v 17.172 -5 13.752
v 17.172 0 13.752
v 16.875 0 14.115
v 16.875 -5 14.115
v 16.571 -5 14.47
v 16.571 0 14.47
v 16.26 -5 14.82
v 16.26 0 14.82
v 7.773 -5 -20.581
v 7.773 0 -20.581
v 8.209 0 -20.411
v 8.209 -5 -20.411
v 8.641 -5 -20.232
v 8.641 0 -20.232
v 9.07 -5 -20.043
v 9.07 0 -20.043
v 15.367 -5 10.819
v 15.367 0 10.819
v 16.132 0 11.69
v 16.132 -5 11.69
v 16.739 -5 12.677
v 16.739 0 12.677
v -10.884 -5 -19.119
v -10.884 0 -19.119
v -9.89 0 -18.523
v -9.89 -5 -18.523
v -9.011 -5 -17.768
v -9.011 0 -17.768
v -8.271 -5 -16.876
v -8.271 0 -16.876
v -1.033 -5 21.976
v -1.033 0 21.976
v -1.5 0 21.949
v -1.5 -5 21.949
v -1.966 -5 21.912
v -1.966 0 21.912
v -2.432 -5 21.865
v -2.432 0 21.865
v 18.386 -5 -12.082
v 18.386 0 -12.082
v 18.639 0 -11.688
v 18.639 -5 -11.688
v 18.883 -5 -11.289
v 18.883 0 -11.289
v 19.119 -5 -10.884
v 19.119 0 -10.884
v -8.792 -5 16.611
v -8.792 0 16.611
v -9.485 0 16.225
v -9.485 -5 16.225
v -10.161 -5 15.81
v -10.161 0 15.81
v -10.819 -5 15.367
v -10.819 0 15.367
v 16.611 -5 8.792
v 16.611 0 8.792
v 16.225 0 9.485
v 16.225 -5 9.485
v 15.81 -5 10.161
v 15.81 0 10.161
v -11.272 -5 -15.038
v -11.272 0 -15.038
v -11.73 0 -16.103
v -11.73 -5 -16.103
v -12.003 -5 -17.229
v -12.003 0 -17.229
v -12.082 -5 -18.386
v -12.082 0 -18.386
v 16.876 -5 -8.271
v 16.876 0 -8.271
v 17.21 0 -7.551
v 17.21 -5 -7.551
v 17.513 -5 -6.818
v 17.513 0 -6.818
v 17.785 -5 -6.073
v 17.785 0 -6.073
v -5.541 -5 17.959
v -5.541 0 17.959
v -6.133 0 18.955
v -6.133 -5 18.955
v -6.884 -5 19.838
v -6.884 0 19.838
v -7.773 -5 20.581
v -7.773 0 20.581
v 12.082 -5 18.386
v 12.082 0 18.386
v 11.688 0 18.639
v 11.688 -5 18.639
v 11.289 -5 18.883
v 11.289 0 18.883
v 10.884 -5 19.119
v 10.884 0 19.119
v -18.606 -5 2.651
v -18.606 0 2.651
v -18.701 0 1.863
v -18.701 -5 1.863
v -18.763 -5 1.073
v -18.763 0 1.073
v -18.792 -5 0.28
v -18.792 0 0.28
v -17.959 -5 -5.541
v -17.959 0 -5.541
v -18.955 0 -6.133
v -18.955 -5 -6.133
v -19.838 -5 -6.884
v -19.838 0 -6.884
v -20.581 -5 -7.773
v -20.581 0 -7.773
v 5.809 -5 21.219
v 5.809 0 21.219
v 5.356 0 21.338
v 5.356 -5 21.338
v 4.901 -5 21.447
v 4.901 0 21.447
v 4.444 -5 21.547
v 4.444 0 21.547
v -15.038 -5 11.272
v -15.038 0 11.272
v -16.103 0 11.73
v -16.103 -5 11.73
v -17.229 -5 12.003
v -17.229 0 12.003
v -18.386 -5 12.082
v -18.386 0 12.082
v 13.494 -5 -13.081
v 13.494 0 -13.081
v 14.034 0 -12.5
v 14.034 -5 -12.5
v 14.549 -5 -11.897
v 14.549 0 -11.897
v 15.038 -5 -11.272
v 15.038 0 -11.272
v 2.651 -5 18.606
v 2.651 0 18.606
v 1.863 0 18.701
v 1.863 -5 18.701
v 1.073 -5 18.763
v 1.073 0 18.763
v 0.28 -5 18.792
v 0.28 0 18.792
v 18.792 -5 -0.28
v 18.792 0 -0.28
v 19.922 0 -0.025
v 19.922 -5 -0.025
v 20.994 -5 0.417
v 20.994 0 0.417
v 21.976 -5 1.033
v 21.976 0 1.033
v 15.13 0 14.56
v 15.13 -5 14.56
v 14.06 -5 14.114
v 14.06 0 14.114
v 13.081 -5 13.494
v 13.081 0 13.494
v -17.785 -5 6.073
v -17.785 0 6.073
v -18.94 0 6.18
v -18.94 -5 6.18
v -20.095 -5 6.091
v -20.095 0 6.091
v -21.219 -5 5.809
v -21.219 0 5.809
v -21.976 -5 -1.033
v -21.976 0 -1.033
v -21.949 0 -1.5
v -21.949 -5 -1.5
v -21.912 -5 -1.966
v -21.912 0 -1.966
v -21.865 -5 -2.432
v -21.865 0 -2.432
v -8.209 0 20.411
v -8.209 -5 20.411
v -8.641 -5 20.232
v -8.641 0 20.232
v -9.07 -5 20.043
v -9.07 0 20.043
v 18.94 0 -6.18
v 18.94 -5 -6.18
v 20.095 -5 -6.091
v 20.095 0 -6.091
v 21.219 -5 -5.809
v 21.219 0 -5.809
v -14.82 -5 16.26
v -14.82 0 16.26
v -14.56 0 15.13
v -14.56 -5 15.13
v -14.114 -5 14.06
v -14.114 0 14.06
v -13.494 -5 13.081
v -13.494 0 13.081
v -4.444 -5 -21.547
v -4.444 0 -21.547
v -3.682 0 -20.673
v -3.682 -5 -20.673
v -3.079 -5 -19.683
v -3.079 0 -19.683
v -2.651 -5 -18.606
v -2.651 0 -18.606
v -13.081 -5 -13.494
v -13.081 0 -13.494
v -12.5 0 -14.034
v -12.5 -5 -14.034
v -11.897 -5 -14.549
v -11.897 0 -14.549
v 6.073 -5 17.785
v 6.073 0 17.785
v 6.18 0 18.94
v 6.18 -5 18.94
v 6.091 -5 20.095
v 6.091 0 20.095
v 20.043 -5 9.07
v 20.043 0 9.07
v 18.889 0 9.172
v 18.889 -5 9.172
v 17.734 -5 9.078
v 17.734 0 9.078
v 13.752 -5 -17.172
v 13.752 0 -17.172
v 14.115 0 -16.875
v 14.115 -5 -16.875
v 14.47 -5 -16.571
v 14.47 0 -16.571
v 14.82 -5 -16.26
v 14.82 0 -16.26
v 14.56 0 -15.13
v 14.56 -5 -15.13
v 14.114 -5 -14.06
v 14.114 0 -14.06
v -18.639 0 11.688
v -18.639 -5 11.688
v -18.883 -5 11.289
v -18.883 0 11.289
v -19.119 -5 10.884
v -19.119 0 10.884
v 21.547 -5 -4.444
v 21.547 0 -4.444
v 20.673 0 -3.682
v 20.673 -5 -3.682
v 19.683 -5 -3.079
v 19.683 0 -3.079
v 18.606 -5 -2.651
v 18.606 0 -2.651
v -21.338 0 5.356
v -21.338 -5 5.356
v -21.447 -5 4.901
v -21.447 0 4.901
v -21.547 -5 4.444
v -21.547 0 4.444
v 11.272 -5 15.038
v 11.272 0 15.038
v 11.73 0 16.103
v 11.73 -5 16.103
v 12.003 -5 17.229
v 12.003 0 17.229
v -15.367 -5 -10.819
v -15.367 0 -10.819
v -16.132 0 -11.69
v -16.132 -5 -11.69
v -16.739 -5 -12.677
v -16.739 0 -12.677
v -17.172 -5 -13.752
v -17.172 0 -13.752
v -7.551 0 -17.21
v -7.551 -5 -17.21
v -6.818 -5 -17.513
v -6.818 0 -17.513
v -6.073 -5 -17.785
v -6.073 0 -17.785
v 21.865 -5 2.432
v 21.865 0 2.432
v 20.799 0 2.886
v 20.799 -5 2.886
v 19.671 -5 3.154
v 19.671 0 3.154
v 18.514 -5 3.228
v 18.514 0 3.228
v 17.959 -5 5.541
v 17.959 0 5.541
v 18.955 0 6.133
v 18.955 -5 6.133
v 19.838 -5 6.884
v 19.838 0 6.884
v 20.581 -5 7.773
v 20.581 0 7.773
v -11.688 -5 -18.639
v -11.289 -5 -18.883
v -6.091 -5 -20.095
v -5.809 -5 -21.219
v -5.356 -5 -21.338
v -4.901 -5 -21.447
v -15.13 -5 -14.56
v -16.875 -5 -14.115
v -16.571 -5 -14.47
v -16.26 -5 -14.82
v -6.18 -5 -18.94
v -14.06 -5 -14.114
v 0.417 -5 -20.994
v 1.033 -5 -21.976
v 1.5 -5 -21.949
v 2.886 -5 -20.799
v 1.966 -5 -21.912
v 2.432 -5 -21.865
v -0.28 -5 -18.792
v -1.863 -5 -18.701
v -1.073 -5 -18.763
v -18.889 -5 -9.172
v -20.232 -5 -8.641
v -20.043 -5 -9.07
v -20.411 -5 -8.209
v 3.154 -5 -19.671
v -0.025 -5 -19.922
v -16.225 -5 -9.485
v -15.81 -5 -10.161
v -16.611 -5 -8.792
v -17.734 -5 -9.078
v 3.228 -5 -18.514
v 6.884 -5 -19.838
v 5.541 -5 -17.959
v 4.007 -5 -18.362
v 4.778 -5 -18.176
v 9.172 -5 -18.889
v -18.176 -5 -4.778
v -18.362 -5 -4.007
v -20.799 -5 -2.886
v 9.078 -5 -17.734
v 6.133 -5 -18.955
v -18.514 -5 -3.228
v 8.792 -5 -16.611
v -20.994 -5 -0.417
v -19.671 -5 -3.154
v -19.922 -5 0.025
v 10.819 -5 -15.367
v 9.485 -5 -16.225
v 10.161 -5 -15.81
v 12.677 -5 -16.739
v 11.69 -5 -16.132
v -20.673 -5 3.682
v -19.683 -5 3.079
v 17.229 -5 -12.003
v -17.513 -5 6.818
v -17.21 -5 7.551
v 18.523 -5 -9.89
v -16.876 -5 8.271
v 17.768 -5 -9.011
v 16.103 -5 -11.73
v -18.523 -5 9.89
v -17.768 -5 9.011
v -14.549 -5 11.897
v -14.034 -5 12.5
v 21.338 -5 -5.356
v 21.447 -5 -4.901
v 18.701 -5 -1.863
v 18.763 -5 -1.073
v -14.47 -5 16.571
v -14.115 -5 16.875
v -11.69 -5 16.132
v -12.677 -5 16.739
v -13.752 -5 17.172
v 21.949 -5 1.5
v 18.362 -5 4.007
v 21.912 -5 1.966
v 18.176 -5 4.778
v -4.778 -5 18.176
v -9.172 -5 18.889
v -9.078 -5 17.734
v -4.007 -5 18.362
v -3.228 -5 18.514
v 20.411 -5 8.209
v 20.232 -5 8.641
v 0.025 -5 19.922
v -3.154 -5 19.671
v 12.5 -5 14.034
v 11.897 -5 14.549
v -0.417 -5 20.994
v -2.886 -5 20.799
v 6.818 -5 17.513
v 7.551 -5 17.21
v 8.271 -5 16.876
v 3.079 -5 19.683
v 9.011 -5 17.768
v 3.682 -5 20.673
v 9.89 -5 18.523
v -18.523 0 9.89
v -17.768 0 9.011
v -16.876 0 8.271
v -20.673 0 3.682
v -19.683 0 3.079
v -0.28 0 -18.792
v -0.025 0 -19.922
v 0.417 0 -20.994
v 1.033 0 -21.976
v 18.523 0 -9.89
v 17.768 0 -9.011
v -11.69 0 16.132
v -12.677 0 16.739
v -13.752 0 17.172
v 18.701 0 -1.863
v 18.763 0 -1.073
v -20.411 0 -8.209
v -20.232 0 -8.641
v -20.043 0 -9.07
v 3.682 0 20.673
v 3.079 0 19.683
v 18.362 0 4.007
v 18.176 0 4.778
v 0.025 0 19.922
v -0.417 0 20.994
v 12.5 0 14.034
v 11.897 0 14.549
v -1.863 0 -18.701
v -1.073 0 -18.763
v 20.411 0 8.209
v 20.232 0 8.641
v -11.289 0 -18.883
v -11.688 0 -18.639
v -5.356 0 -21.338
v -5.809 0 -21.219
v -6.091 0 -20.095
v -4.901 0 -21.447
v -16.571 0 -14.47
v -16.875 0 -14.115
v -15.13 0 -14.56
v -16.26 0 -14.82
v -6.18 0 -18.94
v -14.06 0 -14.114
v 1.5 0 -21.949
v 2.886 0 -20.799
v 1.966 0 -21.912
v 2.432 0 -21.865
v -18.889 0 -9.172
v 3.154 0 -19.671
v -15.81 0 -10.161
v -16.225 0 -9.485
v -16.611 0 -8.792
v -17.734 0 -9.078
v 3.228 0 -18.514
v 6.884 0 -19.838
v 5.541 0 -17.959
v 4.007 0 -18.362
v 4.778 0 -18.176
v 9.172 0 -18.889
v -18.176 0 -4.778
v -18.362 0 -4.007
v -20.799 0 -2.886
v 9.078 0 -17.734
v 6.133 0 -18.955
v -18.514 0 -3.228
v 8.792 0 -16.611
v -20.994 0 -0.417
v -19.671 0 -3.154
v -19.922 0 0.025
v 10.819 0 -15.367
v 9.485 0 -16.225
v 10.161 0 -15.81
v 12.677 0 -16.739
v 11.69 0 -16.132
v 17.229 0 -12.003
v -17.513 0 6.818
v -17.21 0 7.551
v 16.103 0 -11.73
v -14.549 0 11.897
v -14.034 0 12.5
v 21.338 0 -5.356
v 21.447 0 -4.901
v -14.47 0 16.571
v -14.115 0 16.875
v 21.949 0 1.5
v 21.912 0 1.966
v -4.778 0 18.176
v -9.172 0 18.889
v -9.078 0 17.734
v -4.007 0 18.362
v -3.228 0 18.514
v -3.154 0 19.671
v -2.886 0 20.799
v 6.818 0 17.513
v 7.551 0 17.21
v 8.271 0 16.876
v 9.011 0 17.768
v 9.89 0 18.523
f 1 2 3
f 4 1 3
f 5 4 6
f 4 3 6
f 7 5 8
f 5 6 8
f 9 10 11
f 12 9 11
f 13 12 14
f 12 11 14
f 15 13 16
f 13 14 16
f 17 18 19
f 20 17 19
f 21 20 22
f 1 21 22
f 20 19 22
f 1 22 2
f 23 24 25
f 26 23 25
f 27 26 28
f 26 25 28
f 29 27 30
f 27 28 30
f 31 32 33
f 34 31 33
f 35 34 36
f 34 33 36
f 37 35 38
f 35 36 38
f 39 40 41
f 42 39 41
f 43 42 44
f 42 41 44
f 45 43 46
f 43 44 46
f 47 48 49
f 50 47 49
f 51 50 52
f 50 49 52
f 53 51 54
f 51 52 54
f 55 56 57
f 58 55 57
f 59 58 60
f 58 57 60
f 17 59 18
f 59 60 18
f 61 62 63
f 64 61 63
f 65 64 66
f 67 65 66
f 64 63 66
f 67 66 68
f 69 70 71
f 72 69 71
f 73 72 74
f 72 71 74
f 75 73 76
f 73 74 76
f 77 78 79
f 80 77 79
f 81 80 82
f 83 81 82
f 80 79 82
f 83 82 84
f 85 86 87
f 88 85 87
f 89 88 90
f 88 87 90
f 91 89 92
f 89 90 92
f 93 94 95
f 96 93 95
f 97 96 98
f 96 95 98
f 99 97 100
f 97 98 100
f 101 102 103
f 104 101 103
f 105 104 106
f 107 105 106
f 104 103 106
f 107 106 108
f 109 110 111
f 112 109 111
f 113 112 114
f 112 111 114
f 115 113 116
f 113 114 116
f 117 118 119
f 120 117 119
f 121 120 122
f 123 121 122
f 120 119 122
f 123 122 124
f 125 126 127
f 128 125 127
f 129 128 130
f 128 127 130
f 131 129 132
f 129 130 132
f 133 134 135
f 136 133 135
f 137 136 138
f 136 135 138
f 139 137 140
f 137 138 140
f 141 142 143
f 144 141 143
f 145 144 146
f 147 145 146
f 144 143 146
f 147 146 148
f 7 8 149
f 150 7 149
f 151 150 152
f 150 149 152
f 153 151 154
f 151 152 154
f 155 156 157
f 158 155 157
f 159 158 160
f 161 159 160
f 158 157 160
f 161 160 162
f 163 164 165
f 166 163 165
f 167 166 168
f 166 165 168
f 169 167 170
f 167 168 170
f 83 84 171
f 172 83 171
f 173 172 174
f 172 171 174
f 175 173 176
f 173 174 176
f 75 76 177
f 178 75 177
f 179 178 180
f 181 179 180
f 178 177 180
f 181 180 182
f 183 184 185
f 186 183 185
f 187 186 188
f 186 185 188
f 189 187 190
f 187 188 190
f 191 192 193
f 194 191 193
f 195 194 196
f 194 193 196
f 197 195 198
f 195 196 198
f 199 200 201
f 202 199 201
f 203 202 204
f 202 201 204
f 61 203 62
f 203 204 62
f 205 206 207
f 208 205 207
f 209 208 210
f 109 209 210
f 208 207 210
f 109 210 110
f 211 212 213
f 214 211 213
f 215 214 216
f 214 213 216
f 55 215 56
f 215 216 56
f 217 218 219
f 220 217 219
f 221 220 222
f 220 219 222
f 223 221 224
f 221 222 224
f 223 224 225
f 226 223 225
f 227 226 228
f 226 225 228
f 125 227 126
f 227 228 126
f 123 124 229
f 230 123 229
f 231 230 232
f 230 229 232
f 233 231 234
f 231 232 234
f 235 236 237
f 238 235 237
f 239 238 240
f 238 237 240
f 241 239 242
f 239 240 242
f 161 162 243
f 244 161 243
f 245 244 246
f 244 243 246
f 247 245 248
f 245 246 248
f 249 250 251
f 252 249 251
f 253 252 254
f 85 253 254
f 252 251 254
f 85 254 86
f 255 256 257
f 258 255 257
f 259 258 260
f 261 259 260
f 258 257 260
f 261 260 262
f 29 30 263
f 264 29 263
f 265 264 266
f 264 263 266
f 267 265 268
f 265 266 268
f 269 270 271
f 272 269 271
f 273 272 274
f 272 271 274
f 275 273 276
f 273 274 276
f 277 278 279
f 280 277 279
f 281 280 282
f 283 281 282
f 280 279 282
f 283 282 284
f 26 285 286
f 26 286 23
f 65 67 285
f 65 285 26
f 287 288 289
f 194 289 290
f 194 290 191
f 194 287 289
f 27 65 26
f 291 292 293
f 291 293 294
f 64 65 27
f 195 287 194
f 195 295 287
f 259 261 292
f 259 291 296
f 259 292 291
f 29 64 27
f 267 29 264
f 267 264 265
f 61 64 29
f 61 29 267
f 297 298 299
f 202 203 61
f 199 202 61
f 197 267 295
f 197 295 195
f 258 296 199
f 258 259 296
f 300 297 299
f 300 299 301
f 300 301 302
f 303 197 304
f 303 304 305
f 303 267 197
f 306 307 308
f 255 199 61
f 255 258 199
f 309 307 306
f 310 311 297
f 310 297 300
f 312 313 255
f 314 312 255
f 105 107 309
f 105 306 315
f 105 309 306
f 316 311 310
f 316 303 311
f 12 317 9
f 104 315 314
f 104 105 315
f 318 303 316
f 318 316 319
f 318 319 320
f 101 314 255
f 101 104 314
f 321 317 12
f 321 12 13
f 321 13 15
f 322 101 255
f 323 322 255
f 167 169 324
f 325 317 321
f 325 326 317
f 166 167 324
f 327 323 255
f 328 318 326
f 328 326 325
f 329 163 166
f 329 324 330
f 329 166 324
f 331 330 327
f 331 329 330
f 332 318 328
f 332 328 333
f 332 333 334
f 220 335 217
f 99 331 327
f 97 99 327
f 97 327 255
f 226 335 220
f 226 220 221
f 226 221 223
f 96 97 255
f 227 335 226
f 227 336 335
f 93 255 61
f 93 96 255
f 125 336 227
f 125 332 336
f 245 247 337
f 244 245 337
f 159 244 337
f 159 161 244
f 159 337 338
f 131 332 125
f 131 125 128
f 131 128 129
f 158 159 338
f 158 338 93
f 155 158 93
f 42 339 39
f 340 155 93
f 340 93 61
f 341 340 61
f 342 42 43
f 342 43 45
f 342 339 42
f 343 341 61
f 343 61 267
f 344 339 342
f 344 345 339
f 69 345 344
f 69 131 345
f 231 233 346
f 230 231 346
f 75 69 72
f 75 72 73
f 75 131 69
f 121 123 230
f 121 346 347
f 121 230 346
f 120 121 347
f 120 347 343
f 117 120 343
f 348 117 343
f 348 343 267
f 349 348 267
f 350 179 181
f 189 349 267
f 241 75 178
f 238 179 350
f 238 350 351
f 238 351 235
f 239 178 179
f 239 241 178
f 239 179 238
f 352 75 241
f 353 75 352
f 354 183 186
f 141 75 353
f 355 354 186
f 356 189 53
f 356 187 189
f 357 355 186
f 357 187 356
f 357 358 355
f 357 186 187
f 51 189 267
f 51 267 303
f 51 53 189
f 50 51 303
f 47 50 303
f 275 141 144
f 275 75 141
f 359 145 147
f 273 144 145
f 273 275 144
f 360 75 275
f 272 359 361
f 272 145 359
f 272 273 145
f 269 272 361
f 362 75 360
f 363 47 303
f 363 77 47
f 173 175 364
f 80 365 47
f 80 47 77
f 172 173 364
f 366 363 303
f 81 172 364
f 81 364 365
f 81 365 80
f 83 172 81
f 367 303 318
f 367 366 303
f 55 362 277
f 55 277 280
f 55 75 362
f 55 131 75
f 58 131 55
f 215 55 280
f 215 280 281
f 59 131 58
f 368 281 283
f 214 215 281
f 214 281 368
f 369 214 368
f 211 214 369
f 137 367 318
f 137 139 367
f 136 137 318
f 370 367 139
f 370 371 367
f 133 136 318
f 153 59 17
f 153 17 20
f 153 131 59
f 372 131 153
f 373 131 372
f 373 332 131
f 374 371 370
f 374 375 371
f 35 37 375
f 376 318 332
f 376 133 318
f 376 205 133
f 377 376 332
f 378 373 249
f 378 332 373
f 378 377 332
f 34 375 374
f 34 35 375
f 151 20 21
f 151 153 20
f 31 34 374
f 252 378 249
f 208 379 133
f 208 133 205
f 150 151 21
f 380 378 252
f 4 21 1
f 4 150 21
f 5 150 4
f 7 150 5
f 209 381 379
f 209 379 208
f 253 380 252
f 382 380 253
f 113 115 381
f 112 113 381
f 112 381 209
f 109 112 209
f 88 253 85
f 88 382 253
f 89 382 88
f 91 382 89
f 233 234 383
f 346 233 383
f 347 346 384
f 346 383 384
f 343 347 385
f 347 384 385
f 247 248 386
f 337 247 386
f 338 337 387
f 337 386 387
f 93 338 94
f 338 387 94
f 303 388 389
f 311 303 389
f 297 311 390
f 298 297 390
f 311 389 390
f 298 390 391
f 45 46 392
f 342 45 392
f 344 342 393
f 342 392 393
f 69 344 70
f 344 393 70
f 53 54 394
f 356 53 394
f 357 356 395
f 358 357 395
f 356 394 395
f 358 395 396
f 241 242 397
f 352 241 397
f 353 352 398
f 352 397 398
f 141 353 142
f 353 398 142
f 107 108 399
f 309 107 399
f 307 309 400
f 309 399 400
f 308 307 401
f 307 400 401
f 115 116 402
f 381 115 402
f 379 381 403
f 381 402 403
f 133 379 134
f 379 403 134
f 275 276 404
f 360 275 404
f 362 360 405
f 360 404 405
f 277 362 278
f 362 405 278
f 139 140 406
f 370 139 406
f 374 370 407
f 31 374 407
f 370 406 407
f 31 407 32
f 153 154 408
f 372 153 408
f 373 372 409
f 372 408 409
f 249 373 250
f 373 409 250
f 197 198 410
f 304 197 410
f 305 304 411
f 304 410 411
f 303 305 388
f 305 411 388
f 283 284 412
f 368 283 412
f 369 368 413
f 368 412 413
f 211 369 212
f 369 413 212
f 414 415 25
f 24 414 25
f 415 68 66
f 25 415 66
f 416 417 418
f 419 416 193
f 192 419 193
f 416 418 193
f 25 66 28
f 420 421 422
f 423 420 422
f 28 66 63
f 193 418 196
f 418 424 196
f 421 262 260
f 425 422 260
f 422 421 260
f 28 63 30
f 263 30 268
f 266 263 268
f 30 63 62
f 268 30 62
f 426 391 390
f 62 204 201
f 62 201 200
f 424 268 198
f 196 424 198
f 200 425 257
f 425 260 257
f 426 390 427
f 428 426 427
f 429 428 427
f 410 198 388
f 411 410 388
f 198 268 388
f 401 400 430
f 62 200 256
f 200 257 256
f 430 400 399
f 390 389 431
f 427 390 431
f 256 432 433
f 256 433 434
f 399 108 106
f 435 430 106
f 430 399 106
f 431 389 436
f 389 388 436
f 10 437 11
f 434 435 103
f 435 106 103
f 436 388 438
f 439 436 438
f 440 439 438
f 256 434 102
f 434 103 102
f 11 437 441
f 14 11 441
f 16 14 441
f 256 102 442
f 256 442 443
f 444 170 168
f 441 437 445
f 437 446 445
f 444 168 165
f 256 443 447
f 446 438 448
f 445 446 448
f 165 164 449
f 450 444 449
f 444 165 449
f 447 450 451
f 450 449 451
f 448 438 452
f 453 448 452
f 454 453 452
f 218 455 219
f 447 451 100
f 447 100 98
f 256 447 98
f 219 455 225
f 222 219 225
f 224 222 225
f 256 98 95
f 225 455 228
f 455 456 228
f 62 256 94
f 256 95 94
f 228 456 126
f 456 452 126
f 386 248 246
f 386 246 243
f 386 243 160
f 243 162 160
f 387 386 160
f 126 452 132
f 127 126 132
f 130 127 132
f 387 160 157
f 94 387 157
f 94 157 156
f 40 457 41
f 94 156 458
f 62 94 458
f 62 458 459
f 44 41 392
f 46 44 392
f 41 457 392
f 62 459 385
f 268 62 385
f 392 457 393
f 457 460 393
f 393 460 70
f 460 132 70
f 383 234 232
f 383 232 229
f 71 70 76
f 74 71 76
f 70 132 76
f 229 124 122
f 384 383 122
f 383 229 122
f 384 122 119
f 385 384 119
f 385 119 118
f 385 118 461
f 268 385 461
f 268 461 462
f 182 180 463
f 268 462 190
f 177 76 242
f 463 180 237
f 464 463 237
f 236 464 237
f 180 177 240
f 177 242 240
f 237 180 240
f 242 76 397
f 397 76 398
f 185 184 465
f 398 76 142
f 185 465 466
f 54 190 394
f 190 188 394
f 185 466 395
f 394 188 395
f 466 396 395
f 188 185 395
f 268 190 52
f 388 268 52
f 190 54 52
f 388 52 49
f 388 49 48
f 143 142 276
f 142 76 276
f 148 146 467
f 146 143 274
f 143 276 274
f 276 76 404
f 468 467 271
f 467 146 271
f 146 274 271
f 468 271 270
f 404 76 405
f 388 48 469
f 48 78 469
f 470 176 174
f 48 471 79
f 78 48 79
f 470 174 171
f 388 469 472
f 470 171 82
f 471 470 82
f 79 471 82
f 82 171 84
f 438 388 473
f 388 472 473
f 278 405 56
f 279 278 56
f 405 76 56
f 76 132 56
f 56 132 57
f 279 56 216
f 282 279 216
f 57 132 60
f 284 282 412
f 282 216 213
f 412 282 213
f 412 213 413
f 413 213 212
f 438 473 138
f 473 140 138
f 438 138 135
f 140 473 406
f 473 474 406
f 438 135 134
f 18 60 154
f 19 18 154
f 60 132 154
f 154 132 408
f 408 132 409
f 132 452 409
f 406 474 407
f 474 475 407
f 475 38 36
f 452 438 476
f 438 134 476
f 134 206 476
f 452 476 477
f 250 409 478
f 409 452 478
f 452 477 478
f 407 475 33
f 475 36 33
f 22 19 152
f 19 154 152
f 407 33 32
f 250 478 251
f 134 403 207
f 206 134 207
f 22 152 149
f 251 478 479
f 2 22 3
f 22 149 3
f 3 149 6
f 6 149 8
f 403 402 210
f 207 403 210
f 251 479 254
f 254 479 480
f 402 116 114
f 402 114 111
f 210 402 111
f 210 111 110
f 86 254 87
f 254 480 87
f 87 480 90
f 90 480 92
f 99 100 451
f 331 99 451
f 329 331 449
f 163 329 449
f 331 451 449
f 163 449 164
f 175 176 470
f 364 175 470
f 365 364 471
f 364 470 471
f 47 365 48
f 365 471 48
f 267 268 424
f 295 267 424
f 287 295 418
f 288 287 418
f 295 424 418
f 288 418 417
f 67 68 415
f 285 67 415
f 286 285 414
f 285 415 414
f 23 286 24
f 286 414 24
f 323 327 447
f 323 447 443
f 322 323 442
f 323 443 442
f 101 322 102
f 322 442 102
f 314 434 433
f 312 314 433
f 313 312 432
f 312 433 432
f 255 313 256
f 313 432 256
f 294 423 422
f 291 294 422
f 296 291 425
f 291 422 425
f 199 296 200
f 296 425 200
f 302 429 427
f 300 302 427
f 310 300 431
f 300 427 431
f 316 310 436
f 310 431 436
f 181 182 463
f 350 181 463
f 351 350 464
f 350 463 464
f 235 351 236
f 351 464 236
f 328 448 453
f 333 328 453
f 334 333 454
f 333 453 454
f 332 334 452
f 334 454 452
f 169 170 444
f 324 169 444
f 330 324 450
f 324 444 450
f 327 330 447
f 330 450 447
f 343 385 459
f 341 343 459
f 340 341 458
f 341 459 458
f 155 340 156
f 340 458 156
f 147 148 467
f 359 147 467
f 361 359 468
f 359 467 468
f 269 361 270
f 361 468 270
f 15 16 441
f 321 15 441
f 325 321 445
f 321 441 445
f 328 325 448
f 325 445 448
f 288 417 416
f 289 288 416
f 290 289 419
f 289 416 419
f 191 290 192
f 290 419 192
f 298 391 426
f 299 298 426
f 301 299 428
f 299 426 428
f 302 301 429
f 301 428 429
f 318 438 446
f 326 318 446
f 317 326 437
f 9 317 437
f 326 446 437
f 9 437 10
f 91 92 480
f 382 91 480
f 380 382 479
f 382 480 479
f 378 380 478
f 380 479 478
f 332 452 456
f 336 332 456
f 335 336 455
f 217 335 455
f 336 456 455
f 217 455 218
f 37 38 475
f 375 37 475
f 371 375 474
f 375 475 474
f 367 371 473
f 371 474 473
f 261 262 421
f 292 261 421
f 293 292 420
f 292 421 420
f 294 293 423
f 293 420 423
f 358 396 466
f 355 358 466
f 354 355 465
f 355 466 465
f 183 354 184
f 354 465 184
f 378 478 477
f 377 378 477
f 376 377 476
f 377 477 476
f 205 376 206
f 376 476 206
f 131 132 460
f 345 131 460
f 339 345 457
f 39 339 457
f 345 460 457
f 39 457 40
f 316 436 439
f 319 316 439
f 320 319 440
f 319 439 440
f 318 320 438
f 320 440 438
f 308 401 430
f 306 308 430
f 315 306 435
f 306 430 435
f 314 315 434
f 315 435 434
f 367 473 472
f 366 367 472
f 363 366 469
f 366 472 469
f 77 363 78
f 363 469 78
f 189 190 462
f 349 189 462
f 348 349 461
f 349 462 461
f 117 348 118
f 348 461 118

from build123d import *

# Parameters (mm, degrees)
F2_DEPTH = 5
F3_DEPTH = 5
F5_COUNT = 20
F5_ANGLE = 342


with BuildPart() as f2:
    # F1 (on Front) → F2 (new body)
    with BuildSketch(Plane.XZ):
        with BuildLine():
            ThreePointArc((18.791765015, -0.2801004202), (18.7933305583, -0.140054099), (18.7938524157, 0))
            ThreePointArc((18.7938524157, 0), (18.7238802654, 1.6202457939), (18.5144848465, 3.2284267827))
            ThreePointArc((18.5144848465, 3.2284267827), (-18.7354346217, -1.4806681458), (18.791765015, -0.2801004202))
        make_face()
    extrude(amount=F2_DEPTH)

    # F1 (on Front) → F3 (join)
    with BuildSketch(Plane.XZ):
        with BuildLine():
            ThreePointArc((18.5144848465, 3.2284267827), (18.7238802654, 1.6202457939), (18.7938524157, 0))
            ThreePointArc((18.7938524157, 0), (18.7933305583, -0.140054099), (18.791765015, -0.2801004202))
            ThreePointArc((18.791765015, -0.2801004202), (20.4674995965, 0.1731452079), (21.9757526216, 1.0326164403))
            ThreePointArc((21.9757526216, 1.0326164403), (21.9316163904, 1.7332635421), (21.8651473224, 2.4321456718))
            ThreePointArc((21.8651473224, 2.4321456718), (20.2406124153, 3.0440315456), (18.5144848465, 3.2284267827))
        make_face()
    extrude(amount=F3_DEPTH)

    # F5: F2 ×20 about axis
    f5_axis = Axis((0, 6.1465417966, 0), (0, 1, 0))


with BuildPart() as f2_1:
    add(f2.part)
    for i in range(1, F5_COUNT):
        add(f2.part.rotate(f5_axis, i * F5_ANGLE / (F5_COUNT - 1)))


solid = f2_1.part
